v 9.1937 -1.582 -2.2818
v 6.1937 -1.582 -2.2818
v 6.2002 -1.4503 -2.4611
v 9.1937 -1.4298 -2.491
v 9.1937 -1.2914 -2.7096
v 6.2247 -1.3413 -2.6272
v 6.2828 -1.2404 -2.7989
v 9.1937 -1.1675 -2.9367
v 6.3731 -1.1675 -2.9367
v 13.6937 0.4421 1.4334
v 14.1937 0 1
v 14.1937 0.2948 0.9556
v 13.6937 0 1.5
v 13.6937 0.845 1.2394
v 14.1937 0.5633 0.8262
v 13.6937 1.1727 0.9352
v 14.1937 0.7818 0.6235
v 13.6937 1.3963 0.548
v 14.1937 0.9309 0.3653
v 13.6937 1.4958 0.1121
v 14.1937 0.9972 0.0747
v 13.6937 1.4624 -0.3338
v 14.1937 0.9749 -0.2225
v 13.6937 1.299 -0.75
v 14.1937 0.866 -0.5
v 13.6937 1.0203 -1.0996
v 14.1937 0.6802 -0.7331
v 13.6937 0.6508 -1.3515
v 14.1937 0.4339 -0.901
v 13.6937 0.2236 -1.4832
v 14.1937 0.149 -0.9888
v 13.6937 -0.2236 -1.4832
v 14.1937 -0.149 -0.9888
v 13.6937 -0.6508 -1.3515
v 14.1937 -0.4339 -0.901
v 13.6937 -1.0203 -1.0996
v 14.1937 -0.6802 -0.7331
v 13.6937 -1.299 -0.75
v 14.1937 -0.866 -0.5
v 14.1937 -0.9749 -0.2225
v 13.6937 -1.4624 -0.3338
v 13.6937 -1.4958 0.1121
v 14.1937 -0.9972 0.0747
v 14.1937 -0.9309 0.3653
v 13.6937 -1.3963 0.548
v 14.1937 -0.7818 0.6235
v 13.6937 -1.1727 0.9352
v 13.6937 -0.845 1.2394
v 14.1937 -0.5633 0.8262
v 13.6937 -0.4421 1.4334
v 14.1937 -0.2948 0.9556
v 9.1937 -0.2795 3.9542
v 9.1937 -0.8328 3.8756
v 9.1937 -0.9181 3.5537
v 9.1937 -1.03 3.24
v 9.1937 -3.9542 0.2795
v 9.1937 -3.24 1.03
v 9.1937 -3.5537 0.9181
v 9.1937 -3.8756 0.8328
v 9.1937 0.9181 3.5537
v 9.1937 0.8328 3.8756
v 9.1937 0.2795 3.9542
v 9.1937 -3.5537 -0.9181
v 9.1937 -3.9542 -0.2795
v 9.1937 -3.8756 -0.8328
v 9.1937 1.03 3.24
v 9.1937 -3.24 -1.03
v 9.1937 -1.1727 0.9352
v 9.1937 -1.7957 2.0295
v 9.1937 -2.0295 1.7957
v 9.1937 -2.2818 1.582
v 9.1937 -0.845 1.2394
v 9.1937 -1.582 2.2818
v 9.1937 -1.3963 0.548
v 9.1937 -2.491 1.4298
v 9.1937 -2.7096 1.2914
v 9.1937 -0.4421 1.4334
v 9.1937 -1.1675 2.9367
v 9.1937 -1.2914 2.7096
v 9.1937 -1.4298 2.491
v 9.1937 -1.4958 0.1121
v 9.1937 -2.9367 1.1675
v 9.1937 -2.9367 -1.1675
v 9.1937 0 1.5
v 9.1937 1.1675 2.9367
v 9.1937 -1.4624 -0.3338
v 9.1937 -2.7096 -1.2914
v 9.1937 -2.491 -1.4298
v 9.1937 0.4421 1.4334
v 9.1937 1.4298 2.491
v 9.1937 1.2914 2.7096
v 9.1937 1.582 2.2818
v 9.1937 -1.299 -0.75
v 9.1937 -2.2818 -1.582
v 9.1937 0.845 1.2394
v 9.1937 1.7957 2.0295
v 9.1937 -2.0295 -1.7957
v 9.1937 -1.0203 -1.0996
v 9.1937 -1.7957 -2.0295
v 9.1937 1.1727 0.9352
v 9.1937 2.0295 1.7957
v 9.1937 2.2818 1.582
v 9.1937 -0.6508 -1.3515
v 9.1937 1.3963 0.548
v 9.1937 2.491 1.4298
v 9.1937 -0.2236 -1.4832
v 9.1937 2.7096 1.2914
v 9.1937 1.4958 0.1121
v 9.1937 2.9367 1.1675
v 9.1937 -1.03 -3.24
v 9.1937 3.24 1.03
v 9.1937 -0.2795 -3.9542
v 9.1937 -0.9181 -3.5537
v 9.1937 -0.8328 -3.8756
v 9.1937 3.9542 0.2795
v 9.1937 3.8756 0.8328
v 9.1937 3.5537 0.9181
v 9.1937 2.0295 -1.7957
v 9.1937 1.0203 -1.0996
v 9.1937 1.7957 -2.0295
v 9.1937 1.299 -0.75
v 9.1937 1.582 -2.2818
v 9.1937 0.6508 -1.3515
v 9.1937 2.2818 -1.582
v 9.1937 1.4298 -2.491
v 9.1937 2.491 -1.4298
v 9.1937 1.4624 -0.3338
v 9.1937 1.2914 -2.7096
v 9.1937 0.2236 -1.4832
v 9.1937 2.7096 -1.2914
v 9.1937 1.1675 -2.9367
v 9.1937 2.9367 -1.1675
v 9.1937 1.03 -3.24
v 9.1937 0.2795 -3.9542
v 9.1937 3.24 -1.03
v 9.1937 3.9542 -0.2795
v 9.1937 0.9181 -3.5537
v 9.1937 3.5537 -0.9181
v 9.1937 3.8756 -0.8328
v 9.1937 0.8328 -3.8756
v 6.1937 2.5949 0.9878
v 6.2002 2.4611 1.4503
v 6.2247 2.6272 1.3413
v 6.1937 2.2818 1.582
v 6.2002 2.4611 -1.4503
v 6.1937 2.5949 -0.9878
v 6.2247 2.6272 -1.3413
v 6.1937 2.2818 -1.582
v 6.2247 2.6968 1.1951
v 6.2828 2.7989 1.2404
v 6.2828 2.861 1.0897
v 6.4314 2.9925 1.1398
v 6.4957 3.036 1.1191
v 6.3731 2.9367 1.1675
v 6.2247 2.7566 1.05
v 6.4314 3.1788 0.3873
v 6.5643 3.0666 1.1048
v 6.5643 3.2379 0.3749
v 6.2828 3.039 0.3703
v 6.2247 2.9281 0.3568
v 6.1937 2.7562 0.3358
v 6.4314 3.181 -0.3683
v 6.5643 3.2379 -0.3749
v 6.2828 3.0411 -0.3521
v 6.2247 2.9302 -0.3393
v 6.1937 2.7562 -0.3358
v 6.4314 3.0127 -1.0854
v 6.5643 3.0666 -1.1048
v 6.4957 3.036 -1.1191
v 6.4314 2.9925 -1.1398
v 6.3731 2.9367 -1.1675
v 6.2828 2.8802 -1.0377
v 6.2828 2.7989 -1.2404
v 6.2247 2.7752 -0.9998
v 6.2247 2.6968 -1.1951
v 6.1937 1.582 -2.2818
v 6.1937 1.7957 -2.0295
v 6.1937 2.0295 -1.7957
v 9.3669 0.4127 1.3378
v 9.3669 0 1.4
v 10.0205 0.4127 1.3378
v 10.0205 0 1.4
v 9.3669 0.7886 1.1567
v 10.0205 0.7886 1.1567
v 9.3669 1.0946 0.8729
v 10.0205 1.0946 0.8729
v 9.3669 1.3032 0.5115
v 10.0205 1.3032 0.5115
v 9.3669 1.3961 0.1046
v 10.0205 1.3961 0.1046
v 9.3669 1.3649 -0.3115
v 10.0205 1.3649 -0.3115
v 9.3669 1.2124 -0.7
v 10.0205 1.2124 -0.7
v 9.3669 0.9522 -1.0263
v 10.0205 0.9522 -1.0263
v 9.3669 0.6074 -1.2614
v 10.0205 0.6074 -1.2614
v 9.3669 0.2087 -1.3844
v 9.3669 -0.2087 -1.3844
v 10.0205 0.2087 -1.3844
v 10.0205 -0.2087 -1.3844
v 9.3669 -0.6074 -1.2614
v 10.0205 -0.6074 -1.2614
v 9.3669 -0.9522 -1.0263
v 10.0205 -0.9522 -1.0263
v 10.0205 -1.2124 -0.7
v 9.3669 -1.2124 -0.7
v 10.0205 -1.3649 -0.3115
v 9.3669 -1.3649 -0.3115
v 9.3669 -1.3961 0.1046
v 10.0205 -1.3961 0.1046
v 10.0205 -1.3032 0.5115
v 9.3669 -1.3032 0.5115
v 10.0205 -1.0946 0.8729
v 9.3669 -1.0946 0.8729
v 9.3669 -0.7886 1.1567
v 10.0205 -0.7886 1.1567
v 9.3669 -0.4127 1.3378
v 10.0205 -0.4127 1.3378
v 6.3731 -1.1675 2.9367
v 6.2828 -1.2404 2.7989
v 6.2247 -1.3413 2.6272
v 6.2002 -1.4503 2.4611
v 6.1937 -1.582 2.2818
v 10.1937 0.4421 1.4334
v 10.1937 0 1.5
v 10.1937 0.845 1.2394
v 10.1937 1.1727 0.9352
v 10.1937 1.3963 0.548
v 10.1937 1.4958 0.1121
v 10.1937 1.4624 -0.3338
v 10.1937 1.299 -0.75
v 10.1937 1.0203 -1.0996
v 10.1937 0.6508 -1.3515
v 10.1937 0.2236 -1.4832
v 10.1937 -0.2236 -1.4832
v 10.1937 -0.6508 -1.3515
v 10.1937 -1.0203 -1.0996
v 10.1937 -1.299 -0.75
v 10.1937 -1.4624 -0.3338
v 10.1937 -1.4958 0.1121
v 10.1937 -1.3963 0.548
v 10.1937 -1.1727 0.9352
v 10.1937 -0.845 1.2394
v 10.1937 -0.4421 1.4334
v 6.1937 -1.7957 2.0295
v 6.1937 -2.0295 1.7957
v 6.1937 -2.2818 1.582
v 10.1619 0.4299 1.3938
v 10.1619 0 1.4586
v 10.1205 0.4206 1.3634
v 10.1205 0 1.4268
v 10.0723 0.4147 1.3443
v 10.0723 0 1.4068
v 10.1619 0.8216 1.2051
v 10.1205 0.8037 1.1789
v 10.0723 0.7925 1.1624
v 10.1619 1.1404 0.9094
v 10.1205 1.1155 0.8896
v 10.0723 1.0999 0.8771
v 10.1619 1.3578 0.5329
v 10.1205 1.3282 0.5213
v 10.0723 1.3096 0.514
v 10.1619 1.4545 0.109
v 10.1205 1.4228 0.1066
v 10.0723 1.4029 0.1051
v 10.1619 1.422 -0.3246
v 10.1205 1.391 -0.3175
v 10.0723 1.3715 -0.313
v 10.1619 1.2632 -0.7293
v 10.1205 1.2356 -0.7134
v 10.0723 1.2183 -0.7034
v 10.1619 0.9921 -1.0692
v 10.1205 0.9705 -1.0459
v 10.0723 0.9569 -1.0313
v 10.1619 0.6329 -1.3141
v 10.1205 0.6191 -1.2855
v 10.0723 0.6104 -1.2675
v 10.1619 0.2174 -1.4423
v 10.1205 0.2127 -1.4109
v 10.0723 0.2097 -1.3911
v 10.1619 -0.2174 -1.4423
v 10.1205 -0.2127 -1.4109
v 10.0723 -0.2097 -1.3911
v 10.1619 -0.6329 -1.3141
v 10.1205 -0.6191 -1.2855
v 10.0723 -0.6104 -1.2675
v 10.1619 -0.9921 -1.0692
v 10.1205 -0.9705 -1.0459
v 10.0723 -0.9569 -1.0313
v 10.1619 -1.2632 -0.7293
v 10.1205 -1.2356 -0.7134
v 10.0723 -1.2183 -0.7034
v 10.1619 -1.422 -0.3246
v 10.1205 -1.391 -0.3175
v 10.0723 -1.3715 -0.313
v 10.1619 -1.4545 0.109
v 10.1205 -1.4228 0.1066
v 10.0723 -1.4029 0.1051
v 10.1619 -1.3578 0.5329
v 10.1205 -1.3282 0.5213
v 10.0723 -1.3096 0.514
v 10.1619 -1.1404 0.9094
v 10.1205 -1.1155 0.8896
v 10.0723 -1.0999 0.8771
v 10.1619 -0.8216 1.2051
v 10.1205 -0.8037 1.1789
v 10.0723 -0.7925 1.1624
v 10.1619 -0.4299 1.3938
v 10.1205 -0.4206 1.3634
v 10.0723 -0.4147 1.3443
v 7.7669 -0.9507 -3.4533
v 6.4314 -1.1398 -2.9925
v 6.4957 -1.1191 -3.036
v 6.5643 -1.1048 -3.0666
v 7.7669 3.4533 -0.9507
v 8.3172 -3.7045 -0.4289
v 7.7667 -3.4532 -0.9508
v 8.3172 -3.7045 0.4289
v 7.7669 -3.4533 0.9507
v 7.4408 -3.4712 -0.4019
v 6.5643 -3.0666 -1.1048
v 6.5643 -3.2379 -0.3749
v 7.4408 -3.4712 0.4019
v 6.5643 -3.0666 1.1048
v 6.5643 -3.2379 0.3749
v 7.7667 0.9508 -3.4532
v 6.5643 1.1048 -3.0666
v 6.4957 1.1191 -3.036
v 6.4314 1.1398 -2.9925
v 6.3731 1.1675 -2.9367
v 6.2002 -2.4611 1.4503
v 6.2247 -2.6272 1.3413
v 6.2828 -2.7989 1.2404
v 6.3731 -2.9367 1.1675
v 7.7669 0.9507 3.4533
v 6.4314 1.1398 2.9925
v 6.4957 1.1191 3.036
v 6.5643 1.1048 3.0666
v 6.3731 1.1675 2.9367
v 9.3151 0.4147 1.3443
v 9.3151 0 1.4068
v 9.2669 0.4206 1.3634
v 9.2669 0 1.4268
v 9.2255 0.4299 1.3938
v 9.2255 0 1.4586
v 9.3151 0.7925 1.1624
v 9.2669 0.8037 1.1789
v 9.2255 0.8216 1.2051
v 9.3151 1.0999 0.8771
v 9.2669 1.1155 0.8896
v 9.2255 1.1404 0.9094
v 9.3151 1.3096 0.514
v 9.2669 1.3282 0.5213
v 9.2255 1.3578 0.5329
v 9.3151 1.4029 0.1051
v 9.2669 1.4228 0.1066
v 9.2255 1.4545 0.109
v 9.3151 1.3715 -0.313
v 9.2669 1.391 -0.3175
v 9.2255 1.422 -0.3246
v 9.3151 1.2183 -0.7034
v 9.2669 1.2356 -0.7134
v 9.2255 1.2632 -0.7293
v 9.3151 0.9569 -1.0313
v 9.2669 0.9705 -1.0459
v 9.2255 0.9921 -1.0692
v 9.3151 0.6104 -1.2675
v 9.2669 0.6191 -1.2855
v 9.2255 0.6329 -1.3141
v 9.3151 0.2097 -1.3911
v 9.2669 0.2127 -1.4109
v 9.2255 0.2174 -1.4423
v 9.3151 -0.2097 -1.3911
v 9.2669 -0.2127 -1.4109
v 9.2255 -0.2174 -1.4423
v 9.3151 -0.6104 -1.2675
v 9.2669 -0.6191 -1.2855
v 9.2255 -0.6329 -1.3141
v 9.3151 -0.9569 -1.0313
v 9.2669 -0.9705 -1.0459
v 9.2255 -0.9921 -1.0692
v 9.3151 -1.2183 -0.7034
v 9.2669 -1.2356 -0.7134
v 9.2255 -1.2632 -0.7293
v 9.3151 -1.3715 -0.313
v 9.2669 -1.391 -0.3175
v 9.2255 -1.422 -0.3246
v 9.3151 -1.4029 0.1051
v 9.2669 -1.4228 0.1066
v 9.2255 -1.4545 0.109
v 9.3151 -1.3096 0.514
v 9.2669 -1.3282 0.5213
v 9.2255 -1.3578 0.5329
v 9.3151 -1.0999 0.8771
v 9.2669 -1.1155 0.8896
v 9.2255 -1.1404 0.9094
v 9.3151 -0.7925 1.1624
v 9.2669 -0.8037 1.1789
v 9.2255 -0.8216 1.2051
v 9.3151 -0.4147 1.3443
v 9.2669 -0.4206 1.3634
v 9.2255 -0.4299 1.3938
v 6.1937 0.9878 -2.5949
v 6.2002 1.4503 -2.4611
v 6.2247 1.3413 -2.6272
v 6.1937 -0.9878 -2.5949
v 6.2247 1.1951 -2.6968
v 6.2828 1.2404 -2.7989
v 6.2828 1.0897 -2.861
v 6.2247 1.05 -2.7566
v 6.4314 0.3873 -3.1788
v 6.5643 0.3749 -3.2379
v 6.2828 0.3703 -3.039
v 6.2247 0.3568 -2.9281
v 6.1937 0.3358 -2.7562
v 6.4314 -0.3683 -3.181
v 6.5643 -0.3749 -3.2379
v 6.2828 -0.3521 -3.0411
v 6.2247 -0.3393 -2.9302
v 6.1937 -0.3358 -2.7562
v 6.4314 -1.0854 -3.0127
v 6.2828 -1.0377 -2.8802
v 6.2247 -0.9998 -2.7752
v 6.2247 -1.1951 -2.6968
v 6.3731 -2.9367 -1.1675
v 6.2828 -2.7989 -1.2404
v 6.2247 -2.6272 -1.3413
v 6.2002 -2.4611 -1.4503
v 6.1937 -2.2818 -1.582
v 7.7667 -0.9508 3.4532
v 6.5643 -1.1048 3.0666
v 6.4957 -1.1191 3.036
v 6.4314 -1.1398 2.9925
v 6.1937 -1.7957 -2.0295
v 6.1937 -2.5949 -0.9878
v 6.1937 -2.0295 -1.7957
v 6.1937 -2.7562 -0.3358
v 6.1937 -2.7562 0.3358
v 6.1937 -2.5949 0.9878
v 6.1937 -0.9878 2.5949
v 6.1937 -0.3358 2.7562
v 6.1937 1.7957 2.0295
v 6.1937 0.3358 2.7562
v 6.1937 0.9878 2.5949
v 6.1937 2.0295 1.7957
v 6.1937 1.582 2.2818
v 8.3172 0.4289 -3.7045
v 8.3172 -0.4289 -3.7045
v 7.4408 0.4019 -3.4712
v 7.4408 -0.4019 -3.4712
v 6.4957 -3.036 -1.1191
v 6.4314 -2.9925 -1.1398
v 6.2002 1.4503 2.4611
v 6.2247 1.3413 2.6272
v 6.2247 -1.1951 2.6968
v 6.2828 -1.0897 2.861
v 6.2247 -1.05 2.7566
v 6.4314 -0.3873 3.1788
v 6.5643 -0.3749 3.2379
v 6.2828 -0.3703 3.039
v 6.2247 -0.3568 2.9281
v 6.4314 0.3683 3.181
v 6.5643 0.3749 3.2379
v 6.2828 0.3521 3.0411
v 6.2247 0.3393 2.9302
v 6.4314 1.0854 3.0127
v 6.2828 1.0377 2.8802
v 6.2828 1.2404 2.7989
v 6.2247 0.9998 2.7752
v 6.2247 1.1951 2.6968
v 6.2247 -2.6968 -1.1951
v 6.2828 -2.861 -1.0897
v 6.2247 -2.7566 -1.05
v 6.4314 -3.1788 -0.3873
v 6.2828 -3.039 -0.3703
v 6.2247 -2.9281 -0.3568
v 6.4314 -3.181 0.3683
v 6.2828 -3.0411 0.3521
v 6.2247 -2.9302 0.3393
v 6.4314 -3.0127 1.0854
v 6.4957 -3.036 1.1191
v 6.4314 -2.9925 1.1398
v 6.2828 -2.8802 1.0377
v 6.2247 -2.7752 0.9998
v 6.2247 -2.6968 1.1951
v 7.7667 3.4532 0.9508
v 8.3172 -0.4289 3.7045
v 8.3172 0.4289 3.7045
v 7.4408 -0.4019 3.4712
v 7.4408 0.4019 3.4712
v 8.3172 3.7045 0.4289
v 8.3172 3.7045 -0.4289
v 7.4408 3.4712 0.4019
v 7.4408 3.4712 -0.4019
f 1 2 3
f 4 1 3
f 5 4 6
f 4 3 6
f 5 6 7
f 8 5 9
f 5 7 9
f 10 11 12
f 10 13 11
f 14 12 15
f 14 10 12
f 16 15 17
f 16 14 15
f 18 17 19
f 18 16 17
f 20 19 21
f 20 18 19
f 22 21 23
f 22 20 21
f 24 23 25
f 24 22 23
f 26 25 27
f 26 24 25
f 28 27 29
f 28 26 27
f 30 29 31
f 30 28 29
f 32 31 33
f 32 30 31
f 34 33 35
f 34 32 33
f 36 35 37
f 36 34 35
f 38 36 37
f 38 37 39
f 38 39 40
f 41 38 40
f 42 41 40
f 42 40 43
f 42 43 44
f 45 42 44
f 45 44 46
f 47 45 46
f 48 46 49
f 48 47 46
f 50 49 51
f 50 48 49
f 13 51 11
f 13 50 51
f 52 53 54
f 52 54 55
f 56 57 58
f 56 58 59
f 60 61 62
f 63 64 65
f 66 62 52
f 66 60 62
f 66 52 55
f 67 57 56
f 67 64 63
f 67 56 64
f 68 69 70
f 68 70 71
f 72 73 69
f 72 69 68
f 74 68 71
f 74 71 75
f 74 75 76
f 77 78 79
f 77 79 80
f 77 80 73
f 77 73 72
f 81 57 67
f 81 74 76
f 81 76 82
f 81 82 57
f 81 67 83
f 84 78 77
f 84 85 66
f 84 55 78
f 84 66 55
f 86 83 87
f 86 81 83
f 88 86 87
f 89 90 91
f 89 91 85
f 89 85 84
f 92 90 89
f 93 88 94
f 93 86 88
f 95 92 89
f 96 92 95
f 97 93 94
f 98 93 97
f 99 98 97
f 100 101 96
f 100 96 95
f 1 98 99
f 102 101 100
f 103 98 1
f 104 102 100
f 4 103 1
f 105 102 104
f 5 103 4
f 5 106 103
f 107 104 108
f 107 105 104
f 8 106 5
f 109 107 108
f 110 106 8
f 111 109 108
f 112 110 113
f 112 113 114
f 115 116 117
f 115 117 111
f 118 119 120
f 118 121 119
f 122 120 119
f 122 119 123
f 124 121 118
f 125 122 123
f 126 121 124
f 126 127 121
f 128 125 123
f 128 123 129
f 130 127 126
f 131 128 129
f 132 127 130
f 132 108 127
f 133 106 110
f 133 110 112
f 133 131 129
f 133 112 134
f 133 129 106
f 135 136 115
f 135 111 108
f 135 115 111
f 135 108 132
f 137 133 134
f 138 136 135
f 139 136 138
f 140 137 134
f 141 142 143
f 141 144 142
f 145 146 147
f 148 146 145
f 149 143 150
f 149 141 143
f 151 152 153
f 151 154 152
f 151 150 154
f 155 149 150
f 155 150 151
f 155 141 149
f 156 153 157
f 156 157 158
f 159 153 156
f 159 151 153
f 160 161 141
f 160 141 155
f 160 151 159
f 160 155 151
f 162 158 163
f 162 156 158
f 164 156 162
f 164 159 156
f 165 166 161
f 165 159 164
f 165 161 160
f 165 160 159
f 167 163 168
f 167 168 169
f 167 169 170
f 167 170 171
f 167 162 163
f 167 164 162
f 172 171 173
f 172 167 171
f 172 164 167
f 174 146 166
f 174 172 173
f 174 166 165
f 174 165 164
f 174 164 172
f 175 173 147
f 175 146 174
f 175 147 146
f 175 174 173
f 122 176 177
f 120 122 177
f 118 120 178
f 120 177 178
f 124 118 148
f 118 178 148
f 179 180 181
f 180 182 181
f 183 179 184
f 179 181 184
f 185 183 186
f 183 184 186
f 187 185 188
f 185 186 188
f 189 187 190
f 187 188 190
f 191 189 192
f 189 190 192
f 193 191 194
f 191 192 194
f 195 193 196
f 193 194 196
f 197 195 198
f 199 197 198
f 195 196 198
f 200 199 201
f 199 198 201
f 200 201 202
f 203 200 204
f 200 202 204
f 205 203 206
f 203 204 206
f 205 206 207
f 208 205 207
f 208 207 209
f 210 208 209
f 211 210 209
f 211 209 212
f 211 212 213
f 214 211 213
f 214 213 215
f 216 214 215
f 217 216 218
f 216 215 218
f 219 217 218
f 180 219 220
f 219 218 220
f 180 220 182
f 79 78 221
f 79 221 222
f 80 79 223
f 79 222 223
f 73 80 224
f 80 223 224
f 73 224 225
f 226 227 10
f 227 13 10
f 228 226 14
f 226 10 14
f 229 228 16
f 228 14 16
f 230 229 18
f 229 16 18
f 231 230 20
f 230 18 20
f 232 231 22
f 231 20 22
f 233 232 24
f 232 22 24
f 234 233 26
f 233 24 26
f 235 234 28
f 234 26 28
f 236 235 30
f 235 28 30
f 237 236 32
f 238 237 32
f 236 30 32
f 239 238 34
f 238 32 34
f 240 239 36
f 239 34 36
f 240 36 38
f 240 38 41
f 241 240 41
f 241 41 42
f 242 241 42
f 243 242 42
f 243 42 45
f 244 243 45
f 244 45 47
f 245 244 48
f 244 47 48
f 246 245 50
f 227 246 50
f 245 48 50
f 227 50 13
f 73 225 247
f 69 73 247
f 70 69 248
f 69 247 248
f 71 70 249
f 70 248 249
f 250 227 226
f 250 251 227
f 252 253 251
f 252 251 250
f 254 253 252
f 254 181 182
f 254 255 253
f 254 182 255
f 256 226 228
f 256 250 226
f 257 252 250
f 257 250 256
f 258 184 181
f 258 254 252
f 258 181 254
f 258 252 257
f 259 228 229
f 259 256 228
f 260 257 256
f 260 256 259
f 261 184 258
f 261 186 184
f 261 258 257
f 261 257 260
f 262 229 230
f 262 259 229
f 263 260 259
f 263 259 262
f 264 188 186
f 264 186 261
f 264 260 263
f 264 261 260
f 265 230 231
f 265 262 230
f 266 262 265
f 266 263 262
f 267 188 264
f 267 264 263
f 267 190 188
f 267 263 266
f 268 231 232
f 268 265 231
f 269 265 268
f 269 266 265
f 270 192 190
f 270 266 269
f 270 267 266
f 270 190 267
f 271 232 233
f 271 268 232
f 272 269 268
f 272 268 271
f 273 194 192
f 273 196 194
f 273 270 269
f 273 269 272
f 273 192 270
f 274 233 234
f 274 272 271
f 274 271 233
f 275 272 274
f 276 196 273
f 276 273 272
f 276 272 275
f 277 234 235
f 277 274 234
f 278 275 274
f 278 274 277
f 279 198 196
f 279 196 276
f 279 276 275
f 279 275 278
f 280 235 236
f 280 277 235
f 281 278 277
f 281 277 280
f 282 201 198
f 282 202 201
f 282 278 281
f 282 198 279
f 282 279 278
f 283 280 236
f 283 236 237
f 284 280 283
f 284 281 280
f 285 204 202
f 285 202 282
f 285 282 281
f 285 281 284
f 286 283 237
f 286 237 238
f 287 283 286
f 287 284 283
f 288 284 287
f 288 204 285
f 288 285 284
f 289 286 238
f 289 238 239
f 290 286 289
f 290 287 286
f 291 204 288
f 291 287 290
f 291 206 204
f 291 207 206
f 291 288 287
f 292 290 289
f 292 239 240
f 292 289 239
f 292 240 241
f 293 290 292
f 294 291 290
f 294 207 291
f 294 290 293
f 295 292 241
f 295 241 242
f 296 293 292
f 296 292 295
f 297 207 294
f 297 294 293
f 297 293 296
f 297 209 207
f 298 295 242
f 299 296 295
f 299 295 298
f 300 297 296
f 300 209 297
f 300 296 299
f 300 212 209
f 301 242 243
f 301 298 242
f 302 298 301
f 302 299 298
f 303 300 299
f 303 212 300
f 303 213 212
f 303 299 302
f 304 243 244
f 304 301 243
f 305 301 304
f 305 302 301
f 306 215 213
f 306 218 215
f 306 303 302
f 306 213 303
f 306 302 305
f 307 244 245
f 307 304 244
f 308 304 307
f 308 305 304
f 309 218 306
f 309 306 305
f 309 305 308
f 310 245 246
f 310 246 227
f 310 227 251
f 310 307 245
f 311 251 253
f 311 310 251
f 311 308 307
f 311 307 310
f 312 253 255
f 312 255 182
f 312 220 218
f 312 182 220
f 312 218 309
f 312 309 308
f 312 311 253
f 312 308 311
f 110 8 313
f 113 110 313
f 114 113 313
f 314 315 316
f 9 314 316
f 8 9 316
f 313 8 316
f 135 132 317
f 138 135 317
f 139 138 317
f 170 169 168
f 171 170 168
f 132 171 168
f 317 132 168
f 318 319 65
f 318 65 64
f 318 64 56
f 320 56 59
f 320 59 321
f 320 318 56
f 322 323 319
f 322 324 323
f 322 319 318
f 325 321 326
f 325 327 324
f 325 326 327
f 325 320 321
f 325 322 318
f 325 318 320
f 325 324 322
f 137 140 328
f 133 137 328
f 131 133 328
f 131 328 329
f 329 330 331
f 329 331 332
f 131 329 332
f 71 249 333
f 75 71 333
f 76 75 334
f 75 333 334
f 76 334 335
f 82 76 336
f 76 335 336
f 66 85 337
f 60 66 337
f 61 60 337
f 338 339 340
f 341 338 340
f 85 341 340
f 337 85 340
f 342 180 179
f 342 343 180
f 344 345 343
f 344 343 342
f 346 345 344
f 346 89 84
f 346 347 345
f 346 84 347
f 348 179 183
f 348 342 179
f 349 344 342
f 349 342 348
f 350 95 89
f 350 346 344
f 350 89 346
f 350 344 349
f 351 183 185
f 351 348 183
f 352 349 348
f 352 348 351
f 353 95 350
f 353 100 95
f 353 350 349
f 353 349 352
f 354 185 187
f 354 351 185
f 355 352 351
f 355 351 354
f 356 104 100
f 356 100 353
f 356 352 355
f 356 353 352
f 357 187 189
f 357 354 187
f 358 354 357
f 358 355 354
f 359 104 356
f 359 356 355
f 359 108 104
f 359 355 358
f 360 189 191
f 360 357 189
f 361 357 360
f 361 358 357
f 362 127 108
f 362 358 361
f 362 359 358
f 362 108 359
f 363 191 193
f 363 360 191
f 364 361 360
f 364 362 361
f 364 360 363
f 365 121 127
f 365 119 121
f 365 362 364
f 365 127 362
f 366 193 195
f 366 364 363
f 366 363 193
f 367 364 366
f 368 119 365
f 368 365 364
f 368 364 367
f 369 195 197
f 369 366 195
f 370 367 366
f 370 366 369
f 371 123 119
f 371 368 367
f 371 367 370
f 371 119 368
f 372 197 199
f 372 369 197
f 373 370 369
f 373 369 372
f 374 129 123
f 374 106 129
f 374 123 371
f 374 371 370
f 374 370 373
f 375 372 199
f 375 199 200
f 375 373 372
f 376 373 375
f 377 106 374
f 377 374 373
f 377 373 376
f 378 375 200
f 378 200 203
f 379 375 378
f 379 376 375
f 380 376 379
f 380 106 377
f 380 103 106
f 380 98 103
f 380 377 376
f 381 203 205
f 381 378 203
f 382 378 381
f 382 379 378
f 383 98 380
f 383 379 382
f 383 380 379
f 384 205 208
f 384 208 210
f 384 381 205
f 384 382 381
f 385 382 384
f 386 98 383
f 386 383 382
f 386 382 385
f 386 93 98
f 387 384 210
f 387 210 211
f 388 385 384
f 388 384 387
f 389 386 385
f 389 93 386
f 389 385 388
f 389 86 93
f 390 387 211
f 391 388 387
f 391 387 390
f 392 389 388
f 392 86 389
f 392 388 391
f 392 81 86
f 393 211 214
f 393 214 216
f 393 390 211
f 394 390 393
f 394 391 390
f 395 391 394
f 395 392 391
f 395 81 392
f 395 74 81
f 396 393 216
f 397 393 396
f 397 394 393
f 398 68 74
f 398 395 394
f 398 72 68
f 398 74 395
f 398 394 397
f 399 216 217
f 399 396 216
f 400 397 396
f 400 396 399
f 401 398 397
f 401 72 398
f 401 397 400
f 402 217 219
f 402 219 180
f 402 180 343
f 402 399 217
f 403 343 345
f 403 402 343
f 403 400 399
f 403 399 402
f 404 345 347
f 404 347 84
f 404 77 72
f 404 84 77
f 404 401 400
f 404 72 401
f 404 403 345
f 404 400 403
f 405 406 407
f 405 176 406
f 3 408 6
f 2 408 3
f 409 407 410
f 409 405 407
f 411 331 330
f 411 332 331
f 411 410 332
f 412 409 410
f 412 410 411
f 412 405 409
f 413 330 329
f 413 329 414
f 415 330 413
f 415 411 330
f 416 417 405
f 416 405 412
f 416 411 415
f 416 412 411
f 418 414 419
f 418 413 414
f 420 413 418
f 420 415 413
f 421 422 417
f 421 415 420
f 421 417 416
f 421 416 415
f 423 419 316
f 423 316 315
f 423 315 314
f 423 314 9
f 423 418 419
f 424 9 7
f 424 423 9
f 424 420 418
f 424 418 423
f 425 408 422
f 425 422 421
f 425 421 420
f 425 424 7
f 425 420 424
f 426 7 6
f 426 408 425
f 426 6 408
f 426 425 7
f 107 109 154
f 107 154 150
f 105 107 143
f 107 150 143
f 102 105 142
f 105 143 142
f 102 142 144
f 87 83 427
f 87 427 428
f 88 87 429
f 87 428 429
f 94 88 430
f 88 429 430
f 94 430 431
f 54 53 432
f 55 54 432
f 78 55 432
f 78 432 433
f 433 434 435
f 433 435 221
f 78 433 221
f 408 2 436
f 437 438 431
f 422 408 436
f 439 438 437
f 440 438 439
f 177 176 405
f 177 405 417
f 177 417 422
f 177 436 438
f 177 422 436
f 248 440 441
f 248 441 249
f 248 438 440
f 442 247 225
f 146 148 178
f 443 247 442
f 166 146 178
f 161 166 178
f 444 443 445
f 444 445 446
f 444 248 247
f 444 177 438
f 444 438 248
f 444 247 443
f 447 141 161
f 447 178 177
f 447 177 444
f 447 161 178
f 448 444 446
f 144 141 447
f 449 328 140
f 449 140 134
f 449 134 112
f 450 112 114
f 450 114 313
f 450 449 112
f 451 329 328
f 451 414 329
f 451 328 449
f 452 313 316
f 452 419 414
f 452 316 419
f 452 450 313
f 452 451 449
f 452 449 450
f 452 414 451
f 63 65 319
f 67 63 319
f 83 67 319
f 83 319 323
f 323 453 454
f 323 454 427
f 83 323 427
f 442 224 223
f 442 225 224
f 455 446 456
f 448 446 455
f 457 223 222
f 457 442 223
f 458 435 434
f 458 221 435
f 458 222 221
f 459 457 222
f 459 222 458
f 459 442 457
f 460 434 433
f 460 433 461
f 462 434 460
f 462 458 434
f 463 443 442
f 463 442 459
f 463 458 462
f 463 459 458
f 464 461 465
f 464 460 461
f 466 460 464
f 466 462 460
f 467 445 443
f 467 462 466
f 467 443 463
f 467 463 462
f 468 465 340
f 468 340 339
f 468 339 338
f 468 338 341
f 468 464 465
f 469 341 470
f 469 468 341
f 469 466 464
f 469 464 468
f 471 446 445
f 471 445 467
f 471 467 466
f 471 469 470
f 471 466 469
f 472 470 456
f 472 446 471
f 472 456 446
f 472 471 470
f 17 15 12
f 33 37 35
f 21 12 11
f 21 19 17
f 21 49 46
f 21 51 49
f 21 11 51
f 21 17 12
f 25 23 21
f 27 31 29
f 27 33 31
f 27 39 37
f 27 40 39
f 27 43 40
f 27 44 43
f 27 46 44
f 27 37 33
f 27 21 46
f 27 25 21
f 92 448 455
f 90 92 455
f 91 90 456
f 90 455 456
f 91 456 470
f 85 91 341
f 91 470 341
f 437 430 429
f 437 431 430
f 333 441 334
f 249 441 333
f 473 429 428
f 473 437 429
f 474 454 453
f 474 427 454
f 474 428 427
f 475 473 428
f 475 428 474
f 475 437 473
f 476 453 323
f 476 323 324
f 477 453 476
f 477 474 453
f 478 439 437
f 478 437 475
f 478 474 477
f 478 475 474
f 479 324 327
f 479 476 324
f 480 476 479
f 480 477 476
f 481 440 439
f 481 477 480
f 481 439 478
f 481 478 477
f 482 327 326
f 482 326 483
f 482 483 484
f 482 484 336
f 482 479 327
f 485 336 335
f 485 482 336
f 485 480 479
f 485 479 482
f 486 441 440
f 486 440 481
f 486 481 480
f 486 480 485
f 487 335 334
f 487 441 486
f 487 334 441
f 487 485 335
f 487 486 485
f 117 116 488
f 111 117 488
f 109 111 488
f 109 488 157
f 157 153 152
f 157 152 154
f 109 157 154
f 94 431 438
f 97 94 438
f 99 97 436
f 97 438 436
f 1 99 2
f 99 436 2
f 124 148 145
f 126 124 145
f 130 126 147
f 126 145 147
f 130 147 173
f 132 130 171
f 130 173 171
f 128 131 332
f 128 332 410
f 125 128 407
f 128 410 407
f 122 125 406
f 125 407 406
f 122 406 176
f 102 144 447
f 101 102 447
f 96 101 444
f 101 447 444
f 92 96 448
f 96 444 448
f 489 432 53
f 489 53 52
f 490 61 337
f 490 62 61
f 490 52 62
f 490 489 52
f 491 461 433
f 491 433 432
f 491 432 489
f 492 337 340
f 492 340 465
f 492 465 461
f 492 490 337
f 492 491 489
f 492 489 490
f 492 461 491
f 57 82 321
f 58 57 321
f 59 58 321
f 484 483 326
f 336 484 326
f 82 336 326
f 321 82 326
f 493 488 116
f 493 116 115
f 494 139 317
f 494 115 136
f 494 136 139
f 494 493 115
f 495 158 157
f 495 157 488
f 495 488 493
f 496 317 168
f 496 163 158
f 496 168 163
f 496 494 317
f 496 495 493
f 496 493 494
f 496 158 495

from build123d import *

# Parameters (mm, degrees)
F0_W     = 0.65359
F0_H     = 1.4
F0_W_2   = 3.5
F0_H_2   = 1.5
F3_DEPTH = 25


# Not quite as in the source:
# - ends of sketch curves that miss each other by under 0.0002 mm in the source are joined


with BuildPart() as f1:
    # F0 (on Front) → F1 (revolve)
    with BuildSketch(Plane.XZ):
        with BuildLine():
            ThreePointArc((9.366912, 1.4), (9.2669120175, 1.4267949091), (9.1937069394, 1.499999965))
            Line((9.193707, 1.499999965), (9.193707, 0))
            Line((9.193707, 0), (9.366912, 0))
            Line((9.366912, 0), (9.366912, 1.4))
        make_face()
        with Locations((9.693707, 0.7)):
            Rectangle(F0_W, F0_H)
        with BuildLine():
            ThreePointArc((10.1937070606, 1.499999965), (10.1205019825, 1.4267949091), (10.020502, 1.4))
            Line((10.020502, 1.4), (10.020502, 0))
            Line((10.020502, 0), (10.193707, 0))
            Line((10.193707, 0), (10.193707, 1.5))
        make_face()
        with Locations((11.943707, 0.75)):
            Rectangle(F0_W_2, F0_H_2)
        Polygon((14.193707, 1), (13.693707, 1.5), (13.693707, 0), (14.193707, 0), align=None)
        with BuildLine():
            Line((9.193707, 3.964102), (6.564298, 3.259553))
            ThreePointArc((6.5642979867, 3.2595530496), (6.2970304903, 3.0809709236), (6.193707, 2.77659))
            Line((6.193707, 2.77659), (6.193707, 0))
            Line((6.193707, 0), (9.193707, 0))
            Line((9.193707, 0), (9.193707, 1.499999965))
            Line((9.193707, 1.499999965), (9.193707, 3.964102))
        make_face()
    revolve(axis=Axis((10.368707, 0, 0), (-1, 0, 0)))

    # F2 (on face) → F3 (cut)
    with BuildSketch(Plane(origin=(6.193707, 0, 0), x_dir=(0, -1, 0), z_dir=(-1, 0, 0))):
        with BuildLine():
            ThreePointArc((3.8756311548, 0.8328191991), (2.8030435942, 2.8030432168), (0.8328197209, 3.8756310427))
            ThreePointArc((0.8328197209, 3.8756310427), (0.9707821759, 3.3957019848), (1.1674679485, 2.9367028921))
            ThreePointArc((1.1674679485, 2.9367028921), (1.3588439576, 2.5991932034), (1.5820188923, 2.2818124929))
            ThreePointArc((1.5820188923, 2.2818124929), (1.9633456176, 1.9633456176), (2.2818124929, 1.5820188923))
            ThreePointArc((2.2818124929, 1.5820188923), (2.599193614, 1.3588436976), (2.9367037599, 1.1674675107))
            ThreePointArc((2.9367037599, 1.1674675107), (3.3957025442, 0.9707819765), (3.8756311548, 0.8328191991))
        make_face()
        with BuildLine():
            ThreePointArc((-1.1674668381, 2.9367031109), (-0.9707811347, 3.3957021002), (-0.8328183948, 3.8756308663))
            ThreePointArc((-0.8328183948, 3.8756308663), (-2.8030431743, 2.8030436368), (-3.8756311107, 0.8328194045))
            ThreePointArc((-3.8756311107, 0.8328194045), (-3.3957018345, 0.970781873), (-2.9367033101, 1.167467233))
            ThreePointArc((-2.9367033101, 1.167467233), (-2.5991940372, 1.3588427967), (-2.281813665, 1.5820172017))
            ThreePointArc((-2.281813665, 1.5820172017), (-1.9633454104, 1.9633458247), (-1.5820167202, 2.2818139988))
            ThreePointArc((-1.5820167202, 2.2818139988), (-1.3588423817, 2.5991941131), (-1.1674668381, 2.9367031109))
        make_face()
        with BuildLine():
            ThreePointArc((2.2818124929, 1.5820188923), (1.9633456176, 1.9633456176), (1.5820188923, 2.2818124929))
            ThreePointArc((1.5820188923, 2.2818124929), (1.9101898753, 1.9101898753), (2.2818124929, 1.5820188923))
        make_face()
        with BuildLine():
            ThreePointArc((-2.281813665, 1.5820172017), (-1.9101891737, 1.9101895768), (-1.5820167202, 2.2818139988))
            ThreePointArc((-1.5820167202, 2.2818139988), (-1.9633454104, 1.9633458247), (-2.281813665, 1.5820172017))
        make_face()
        with BuildLine():
            ThreePointArc((-2.9367033101, -1.167467233), (-3.3957018345, -0.970781873), (-3.8756300769, -0.8328193482))
            ThreePointArc((-3.8756300769, -0.8328193482), (-2.8030431743, -2.8030436368), (-0.8328187651, -3.8756312481))
            ThreePointArc((-0.8328187651, -3.8756312481), (-0.9707811347, -3.3957021002), (-1.1674668381, -2.9367031109))
            ThreePointArc((-1.1674668381, -2.9367031109), (-1.3588423817, -2.5991941131), (-1.5820167202, -2.2818139988))
            ThreePointArc((-1.5820167202, -2.2818139988), (-1.9633454104, -1.9633458247), (-2.281813665, -1.5820172017))
            ThreePointArc((-2.281813665, -1.5820172017), (-2.5991940372, -1.3588427967), (-2.9367033101, -1.167467233))
        make_face()
        with BuildLine():
            ThreePointArc((0.8328197209, -3.8756310427), (2.8030435942, -2.8030432168), (3.8756311548, -0.8328191991))
            ThreePointArc((3.8756311548, -0.8328191991), (3.3957025442, -0.9707819765), (2.9367037599, -1.1674675107))
            ThreePointArc((2.9367037599, -1.1674675107), (2.599193614, -1.3588436976), (2.2818124929, -1.5820188923))
            ThreePointArc((2.2818124929, -1.5820188923), (1.9633456176, -1.9633456176), (1.5820188923, -2.2818124929))
            ThreePointArc((1.5820188923, -2.2818124929), (1.3588439576, -2.5991932034), (1.1674679485, -2.9367028921))
            ThreePointArc((1.1674679485, -2.9367028921), (0.9707821759, -3.3957019848), (0.8328197209, -3.8756310427))
        make_face()
        with BuildLine():
            ThreePointArc((1.5820188923, -2.2818124929), (1.9633456176, -1.9633456176), (2.2818124929, -1.5820188923))
            ThreePointArc((2.2818124929, -1.5820188923), (1.9101898753, -1.9101898753), (1.5820188923, -2.2818124929))
        make_face()
        with BuildLine():
            ThreePointArc((-1.5820167202, -2.2818139988), (-1.9101891737, -1.9101895768), (-2.281813665, -1.5820172017))
            ThreePointArc((-2.281813665, -1.5820172017), (-1.9633454104, -1.9633458247), (-1.5820167202, -2.2818139988))
        make_face()
    extrude(amount=-F3_DEPTH, mode=Mode.SUBTRACT)


solid = f1.part
